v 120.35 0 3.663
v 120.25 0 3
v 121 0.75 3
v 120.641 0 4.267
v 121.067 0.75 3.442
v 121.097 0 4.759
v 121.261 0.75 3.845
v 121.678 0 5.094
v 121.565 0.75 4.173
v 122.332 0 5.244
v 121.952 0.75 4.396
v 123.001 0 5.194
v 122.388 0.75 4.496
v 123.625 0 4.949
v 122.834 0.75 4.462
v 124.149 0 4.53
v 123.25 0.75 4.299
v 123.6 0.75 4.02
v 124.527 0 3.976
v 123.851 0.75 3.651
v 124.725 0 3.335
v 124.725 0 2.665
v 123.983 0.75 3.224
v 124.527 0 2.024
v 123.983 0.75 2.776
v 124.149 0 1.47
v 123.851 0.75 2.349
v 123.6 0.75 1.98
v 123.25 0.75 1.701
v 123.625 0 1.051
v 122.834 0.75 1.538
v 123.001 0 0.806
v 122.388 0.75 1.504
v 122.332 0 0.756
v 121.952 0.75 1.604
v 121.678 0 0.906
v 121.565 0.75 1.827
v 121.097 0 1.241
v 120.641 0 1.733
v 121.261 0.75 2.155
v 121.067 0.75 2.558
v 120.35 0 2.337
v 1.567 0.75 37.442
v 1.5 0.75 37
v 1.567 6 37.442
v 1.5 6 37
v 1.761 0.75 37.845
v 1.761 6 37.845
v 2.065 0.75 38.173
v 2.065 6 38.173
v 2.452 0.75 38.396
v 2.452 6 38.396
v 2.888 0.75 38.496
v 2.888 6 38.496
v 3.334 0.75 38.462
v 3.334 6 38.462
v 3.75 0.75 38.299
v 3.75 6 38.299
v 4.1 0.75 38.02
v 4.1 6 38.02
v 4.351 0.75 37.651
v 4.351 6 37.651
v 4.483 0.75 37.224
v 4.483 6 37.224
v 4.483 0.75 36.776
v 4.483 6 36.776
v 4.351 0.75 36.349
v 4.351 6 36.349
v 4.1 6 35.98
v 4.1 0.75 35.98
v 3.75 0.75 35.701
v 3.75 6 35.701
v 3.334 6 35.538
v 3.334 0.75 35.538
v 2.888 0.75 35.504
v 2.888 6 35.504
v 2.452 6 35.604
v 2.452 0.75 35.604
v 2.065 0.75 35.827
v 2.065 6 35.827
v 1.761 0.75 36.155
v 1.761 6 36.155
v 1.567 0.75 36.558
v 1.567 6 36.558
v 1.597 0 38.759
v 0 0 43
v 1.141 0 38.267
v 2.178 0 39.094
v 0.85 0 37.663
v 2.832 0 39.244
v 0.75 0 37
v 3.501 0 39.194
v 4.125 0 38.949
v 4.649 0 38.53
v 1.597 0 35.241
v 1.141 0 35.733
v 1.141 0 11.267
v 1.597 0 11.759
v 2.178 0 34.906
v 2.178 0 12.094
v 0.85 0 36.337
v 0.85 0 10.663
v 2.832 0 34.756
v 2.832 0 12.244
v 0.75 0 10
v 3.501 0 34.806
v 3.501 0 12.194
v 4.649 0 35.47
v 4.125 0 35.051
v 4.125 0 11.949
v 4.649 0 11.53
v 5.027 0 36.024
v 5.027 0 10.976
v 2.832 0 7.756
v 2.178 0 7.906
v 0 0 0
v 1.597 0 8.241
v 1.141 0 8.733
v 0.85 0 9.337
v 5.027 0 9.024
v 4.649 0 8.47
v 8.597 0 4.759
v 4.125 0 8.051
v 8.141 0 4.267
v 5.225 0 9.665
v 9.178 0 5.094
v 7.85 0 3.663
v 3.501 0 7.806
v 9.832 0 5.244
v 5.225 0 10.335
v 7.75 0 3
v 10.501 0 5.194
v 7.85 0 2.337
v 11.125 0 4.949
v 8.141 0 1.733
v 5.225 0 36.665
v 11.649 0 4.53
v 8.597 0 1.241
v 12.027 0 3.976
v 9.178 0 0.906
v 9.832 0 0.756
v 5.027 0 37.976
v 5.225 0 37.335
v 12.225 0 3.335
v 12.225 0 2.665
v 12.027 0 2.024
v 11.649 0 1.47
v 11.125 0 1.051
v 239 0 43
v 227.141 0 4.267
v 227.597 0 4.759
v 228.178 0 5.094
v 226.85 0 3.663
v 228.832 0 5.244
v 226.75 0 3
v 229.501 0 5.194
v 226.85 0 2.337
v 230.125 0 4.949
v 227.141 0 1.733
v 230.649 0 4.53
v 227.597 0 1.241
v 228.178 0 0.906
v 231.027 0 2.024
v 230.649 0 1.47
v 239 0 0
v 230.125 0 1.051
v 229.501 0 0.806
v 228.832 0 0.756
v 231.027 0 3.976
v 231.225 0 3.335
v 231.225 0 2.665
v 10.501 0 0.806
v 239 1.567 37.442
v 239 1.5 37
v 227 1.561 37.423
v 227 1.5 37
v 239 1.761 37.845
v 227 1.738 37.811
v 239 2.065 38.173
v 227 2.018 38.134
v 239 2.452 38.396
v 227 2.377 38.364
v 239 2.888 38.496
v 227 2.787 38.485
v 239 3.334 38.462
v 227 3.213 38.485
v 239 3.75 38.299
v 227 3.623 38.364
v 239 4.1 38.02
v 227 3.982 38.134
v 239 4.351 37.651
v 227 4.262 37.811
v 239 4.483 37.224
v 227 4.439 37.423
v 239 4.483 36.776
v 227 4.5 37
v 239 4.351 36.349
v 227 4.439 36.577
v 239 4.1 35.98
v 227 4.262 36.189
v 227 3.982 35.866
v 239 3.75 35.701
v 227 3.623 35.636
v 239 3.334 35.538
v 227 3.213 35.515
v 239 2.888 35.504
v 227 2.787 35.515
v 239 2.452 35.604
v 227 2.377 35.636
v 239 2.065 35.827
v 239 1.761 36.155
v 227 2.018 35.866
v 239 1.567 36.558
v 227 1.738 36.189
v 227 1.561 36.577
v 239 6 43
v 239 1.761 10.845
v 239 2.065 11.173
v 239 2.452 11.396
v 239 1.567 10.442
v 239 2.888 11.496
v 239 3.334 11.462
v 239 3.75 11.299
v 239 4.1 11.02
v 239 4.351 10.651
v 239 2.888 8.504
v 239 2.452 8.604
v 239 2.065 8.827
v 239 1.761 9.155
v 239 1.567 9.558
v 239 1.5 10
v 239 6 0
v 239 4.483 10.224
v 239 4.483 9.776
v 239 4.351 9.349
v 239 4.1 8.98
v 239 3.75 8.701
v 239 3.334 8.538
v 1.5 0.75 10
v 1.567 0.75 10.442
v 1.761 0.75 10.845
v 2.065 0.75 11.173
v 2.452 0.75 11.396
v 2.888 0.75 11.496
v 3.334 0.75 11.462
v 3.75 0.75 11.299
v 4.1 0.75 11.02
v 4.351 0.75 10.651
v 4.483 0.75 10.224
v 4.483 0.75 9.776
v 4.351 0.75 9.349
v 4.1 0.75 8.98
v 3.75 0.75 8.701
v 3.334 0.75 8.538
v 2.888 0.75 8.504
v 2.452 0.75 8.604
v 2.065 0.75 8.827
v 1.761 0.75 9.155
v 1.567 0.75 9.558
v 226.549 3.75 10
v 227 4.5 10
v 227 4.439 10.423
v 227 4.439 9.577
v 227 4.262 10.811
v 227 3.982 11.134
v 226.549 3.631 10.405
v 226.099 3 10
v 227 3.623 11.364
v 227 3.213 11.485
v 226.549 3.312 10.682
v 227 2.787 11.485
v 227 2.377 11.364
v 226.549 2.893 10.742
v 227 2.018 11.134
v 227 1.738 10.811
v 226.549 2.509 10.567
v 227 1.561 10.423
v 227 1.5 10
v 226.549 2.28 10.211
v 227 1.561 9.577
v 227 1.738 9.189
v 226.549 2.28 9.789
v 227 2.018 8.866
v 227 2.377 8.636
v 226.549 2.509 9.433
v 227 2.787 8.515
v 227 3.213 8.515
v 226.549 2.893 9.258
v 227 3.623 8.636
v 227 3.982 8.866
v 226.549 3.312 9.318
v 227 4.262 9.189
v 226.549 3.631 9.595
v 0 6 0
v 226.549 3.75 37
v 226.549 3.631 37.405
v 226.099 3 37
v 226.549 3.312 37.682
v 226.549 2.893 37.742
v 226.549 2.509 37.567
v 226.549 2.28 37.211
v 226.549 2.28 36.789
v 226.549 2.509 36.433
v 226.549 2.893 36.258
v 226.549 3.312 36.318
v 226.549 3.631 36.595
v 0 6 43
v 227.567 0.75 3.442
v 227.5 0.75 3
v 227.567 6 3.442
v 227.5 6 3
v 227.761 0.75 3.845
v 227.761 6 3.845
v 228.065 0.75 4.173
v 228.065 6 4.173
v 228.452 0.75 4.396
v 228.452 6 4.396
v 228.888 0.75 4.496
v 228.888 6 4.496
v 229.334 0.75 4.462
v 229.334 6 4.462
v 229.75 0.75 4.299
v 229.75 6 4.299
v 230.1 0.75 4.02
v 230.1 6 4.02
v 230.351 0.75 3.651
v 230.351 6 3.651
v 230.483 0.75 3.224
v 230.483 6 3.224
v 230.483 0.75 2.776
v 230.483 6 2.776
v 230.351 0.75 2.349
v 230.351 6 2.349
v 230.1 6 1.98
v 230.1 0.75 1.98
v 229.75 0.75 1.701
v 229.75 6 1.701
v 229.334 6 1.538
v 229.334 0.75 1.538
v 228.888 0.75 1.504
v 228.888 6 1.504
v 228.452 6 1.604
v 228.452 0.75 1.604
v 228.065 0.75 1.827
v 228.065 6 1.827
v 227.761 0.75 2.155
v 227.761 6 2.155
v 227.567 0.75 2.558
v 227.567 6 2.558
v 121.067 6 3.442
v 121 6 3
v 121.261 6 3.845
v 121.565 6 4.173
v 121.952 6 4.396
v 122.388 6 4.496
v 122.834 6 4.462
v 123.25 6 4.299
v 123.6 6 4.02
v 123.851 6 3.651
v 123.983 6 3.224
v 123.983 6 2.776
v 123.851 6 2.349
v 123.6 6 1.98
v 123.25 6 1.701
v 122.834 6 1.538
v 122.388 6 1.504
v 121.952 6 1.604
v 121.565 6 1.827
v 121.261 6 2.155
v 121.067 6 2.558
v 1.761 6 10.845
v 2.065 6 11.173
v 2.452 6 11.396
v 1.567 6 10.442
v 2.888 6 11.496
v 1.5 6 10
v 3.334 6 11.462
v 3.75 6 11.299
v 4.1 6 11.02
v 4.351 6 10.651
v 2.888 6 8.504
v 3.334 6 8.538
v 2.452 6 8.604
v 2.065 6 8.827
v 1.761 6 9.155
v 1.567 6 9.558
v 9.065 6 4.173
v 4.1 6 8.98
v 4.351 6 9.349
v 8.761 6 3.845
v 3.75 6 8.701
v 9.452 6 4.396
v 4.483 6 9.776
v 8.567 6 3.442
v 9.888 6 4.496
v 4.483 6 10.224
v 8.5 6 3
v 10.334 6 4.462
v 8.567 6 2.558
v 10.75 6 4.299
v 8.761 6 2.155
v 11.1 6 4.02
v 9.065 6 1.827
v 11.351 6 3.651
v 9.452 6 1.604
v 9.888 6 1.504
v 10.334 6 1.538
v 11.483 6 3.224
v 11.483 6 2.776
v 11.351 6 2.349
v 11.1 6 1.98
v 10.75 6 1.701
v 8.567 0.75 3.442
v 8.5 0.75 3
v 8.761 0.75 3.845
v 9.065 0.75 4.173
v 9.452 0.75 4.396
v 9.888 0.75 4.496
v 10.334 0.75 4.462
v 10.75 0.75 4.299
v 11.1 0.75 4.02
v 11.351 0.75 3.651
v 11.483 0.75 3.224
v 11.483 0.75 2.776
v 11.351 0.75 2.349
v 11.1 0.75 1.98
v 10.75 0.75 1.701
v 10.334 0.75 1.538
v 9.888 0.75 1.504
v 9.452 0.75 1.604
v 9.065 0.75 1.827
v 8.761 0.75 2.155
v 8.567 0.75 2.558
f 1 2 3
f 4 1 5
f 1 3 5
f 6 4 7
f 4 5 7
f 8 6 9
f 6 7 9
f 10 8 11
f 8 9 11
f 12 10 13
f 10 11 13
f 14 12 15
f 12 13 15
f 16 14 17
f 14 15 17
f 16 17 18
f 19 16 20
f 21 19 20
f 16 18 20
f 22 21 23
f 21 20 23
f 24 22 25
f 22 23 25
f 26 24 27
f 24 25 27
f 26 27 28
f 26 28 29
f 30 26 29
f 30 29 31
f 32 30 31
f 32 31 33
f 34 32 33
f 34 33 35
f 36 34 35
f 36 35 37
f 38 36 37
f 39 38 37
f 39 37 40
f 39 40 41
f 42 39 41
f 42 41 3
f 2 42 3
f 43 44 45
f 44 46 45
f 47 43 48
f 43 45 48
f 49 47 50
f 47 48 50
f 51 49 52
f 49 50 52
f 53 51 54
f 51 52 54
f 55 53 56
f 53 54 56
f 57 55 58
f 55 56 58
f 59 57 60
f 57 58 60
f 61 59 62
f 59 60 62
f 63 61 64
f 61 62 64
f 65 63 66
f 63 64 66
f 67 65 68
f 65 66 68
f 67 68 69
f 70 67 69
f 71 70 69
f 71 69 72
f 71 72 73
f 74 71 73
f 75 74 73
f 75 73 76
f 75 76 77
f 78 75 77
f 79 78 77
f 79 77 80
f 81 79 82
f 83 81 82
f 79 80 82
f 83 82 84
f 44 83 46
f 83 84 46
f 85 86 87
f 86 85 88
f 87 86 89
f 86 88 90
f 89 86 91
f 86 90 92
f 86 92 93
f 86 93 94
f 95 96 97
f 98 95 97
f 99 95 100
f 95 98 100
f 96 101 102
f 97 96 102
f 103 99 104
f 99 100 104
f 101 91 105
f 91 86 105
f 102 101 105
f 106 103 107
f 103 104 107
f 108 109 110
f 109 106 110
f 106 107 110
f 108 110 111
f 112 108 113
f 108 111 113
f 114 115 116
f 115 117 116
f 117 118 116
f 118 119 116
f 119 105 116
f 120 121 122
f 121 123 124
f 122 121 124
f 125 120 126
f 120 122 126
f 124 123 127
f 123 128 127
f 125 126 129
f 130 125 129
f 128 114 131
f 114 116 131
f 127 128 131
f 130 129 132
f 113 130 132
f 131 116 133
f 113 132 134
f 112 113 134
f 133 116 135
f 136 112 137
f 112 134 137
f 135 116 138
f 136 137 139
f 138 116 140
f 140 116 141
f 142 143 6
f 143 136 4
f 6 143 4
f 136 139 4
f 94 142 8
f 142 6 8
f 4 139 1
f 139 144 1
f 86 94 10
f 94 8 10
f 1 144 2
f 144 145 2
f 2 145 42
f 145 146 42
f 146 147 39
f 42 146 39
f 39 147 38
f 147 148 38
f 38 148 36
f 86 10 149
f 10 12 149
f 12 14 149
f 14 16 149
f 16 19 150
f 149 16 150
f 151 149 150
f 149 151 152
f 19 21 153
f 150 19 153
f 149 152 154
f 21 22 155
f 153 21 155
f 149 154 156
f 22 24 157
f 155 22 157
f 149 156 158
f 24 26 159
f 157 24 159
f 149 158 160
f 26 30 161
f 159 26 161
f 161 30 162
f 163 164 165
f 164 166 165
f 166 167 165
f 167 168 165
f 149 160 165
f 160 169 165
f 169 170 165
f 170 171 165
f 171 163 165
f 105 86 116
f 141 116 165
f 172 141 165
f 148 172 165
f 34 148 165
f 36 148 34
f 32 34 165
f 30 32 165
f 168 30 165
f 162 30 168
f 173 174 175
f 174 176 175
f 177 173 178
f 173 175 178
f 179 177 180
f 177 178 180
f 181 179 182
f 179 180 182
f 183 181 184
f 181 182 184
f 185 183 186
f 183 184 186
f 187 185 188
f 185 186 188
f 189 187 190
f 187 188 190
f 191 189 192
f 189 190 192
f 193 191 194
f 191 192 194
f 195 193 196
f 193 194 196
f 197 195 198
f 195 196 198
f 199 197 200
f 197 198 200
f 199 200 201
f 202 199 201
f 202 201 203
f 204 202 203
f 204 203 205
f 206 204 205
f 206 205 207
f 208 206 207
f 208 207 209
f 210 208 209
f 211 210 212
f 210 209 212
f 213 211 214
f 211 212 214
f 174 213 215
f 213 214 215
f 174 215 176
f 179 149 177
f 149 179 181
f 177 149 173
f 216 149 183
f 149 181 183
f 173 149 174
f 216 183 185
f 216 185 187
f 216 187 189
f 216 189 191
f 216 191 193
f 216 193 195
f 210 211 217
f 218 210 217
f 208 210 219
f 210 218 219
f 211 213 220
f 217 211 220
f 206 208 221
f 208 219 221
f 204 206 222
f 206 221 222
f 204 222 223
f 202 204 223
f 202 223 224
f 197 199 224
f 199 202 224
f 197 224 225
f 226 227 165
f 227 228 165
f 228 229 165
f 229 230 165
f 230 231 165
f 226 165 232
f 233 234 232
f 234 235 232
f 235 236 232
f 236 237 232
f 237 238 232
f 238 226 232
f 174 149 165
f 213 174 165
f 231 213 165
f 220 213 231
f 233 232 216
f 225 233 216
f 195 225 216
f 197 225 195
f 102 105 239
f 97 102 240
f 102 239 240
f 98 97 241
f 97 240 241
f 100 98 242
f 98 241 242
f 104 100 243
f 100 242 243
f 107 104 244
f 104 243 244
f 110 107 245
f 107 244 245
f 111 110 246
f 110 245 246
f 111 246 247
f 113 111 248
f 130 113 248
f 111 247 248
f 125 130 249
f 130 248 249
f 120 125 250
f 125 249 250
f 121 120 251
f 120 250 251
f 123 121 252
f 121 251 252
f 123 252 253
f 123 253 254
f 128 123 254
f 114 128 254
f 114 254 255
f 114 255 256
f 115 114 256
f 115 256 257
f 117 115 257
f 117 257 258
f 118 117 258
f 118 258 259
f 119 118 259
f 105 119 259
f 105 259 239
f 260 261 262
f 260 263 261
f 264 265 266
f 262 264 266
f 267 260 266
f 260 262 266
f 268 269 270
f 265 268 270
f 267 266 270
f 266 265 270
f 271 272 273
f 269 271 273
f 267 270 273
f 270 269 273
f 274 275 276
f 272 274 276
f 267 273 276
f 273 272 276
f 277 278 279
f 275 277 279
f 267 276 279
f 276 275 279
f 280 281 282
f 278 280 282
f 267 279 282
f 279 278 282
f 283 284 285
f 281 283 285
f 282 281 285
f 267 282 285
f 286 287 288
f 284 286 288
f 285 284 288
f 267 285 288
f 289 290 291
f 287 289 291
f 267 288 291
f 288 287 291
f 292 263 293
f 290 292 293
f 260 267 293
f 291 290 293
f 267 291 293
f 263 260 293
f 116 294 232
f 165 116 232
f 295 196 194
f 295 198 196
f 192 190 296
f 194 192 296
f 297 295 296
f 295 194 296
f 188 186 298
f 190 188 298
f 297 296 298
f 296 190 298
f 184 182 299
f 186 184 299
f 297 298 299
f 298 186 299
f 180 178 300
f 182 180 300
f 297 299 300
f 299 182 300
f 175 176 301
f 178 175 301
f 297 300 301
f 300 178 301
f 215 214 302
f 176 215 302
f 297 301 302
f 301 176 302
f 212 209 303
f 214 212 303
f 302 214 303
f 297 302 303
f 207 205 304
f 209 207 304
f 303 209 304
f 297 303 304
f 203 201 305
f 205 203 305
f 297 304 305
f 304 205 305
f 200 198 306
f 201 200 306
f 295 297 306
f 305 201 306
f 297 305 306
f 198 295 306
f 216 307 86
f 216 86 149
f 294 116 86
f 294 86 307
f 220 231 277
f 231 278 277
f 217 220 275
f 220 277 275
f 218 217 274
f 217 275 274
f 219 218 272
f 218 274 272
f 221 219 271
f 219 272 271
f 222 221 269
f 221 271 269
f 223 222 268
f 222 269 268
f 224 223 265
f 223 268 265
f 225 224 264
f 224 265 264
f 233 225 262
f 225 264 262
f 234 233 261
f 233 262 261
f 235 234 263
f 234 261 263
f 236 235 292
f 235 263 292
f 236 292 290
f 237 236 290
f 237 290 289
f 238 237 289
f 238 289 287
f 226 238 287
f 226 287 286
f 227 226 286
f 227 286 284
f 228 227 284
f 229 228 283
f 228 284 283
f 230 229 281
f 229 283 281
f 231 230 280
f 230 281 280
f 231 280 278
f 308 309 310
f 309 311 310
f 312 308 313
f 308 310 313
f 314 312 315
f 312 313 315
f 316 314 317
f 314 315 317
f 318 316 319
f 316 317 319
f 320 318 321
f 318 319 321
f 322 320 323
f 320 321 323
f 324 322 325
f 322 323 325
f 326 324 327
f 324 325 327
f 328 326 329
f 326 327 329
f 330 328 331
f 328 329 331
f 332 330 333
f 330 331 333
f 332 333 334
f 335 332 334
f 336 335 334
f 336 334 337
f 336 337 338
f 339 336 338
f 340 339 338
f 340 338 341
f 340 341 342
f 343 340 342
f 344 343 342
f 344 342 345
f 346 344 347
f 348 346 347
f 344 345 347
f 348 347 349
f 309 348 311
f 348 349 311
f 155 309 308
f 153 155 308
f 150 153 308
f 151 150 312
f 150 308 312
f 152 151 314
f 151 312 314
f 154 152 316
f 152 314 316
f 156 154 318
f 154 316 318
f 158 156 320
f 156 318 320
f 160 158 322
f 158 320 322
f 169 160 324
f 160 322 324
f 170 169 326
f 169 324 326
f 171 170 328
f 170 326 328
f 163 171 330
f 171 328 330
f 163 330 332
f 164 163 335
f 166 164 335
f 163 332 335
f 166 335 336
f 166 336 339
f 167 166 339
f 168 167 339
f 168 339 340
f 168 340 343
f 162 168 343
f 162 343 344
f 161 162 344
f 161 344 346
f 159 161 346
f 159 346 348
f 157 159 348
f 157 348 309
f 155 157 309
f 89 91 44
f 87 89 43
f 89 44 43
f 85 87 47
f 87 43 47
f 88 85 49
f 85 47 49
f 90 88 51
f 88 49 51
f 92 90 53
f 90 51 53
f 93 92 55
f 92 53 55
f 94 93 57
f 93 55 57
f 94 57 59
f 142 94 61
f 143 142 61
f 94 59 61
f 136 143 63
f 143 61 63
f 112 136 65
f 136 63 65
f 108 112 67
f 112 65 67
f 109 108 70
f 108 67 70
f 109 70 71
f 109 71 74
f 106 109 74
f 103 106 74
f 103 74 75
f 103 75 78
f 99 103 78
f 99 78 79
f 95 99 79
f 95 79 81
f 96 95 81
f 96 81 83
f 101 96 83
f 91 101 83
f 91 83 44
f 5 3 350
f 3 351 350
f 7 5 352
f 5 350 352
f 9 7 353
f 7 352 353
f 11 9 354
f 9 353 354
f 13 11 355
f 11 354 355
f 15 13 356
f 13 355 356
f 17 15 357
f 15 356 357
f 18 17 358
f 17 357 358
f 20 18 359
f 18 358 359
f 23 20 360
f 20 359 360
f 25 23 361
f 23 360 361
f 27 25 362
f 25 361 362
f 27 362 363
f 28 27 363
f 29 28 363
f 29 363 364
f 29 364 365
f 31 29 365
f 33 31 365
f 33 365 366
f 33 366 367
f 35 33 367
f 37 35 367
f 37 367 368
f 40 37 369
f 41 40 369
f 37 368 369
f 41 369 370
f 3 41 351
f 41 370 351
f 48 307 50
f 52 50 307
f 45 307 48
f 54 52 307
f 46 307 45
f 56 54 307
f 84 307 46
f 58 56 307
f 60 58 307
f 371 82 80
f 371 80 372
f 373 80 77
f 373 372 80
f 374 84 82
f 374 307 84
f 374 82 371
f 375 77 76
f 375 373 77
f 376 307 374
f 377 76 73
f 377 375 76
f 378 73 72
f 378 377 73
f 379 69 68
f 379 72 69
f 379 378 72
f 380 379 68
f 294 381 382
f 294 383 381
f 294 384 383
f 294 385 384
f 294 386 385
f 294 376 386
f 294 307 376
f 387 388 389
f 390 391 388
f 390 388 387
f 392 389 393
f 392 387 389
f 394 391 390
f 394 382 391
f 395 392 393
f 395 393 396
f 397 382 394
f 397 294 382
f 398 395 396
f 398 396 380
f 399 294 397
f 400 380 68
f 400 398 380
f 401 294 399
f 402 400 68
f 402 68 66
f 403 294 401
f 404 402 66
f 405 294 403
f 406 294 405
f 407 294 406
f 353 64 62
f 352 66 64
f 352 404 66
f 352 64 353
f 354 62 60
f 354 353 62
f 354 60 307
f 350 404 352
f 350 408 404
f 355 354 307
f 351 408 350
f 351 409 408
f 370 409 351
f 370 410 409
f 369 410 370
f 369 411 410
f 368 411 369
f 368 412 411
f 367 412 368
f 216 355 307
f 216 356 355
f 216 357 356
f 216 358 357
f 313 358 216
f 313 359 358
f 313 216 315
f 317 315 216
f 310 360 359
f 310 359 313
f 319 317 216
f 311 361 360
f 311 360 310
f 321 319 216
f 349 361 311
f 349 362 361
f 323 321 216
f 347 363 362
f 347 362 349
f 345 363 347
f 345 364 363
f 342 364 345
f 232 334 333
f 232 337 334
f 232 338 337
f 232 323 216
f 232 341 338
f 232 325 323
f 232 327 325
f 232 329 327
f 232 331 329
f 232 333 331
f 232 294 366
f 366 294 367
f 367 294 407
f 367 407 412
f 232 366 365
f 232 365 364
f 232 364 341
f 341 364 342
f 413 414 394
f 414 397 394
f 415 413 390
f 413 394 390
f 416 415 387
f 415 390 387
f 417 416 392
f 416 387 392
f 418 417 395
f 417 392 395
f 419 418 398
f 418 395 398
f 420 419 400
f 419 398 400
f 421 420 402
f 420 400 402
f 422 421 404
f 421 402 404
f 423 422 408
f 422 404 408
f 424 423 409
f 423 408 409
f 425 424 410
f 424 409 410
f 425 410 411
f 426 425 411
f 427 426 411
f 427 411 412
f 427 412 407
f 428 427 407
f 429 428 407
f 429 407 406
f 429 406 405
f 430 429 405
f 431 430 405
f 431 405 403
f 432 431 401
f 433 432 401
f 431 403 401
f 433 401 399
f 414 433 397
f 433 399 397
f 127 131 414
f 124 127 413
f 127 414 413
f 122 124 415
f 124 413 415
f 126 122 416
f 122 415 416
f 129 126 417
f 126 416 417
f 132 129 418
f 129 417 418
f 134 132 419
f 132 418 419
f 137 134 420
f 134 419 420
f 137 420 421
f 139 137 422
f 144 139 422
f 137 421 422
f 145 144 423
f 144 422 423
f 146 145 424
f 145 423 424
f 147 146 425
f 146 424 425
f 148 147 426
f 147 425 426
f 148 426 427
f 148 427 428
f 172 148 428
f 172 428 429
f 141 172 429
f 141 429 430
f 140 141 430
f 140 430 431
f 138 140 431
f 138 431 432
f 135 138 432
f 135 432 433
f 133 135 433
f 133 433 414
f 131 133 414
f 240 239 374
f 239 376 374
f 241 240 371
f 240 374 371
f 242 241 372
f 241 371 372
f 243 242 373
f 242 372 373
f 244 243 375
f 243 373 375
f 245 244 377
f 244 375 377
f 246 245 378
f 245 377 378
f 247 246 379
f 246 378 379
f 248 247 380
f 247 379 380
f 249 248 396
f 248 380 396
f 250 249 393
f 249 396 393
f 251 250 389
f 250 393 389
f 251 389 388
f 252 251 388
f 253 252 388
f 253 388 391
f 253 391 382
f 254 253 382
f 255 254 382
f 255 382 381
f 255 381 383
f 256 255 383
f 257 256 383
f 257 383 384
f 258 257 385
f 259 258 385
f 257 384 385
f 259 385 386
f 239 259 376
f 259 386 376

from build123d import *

# Parameters (mm, degrees)
F0_W           = 239
F0_H           = 6
F1_DEPTH       = 43
F3_D           = 3
F3_DEPTH       = 12
F3_TIP         = 0.9012909285
F5_D           = 3
F5_DEPTH       = 12
F5_CSINK_D     = 4.5
F5_CSINK_ANGLE = 90
F5_TIP         = 0.9012909285
F7_D           = 3
F7_CSINK_D     = 4.5
F7_CSINK_ANGLE = 90


with BuildPart() as f1:
    # F0 (on Top) → F1 (new body)
    with BuildSketch(Plane.XY):
        with Locations((119.5, 3)):
            Rectangle(F0_W, F0_H)
    extrude(amount=F1_DEPTH)

    # F3
    with Locations(Plane.YZ.offset(239)):
        with Locations((3, 37), (3, 10)):
            Hole(F3_D / 2, depth=F3_DEPTH)
            with Locations((0, 0, -(F3_DEPTH + F3_TIP / 2))):  # 118° drill point
                Cone(0, F3_D / 2, F3_TIP, mode=Mode.SUBTRACT)

    # F5
    with Locations(Plane.XZ):
        with Locations((3, 37), (3, 10)):
            CounterSinkHole(F5_D / 2, F5_CSINK_D / 2, depth=F5_DEPTH, counter_sink_angle=F5_CSINK_ANGLE)
            with Locations((0, 0, -(F5_DEPTH + F5_TIP / 2))):  # 118° drill point
                Cone(0, F5_D / 2, F5_TIP, mode=Mode.SUBTRACT)

    # F7 (through all)
    with Locations(Plane.XZ):
        with Locations((122.5, 3), (229, 3), (10, 3)):
            CounterSinkHole(F7_D / 2, F7_CSINK_D / 2, counter_sink_angle=F7_CSINK_ANGLE)


solid = f1.part
